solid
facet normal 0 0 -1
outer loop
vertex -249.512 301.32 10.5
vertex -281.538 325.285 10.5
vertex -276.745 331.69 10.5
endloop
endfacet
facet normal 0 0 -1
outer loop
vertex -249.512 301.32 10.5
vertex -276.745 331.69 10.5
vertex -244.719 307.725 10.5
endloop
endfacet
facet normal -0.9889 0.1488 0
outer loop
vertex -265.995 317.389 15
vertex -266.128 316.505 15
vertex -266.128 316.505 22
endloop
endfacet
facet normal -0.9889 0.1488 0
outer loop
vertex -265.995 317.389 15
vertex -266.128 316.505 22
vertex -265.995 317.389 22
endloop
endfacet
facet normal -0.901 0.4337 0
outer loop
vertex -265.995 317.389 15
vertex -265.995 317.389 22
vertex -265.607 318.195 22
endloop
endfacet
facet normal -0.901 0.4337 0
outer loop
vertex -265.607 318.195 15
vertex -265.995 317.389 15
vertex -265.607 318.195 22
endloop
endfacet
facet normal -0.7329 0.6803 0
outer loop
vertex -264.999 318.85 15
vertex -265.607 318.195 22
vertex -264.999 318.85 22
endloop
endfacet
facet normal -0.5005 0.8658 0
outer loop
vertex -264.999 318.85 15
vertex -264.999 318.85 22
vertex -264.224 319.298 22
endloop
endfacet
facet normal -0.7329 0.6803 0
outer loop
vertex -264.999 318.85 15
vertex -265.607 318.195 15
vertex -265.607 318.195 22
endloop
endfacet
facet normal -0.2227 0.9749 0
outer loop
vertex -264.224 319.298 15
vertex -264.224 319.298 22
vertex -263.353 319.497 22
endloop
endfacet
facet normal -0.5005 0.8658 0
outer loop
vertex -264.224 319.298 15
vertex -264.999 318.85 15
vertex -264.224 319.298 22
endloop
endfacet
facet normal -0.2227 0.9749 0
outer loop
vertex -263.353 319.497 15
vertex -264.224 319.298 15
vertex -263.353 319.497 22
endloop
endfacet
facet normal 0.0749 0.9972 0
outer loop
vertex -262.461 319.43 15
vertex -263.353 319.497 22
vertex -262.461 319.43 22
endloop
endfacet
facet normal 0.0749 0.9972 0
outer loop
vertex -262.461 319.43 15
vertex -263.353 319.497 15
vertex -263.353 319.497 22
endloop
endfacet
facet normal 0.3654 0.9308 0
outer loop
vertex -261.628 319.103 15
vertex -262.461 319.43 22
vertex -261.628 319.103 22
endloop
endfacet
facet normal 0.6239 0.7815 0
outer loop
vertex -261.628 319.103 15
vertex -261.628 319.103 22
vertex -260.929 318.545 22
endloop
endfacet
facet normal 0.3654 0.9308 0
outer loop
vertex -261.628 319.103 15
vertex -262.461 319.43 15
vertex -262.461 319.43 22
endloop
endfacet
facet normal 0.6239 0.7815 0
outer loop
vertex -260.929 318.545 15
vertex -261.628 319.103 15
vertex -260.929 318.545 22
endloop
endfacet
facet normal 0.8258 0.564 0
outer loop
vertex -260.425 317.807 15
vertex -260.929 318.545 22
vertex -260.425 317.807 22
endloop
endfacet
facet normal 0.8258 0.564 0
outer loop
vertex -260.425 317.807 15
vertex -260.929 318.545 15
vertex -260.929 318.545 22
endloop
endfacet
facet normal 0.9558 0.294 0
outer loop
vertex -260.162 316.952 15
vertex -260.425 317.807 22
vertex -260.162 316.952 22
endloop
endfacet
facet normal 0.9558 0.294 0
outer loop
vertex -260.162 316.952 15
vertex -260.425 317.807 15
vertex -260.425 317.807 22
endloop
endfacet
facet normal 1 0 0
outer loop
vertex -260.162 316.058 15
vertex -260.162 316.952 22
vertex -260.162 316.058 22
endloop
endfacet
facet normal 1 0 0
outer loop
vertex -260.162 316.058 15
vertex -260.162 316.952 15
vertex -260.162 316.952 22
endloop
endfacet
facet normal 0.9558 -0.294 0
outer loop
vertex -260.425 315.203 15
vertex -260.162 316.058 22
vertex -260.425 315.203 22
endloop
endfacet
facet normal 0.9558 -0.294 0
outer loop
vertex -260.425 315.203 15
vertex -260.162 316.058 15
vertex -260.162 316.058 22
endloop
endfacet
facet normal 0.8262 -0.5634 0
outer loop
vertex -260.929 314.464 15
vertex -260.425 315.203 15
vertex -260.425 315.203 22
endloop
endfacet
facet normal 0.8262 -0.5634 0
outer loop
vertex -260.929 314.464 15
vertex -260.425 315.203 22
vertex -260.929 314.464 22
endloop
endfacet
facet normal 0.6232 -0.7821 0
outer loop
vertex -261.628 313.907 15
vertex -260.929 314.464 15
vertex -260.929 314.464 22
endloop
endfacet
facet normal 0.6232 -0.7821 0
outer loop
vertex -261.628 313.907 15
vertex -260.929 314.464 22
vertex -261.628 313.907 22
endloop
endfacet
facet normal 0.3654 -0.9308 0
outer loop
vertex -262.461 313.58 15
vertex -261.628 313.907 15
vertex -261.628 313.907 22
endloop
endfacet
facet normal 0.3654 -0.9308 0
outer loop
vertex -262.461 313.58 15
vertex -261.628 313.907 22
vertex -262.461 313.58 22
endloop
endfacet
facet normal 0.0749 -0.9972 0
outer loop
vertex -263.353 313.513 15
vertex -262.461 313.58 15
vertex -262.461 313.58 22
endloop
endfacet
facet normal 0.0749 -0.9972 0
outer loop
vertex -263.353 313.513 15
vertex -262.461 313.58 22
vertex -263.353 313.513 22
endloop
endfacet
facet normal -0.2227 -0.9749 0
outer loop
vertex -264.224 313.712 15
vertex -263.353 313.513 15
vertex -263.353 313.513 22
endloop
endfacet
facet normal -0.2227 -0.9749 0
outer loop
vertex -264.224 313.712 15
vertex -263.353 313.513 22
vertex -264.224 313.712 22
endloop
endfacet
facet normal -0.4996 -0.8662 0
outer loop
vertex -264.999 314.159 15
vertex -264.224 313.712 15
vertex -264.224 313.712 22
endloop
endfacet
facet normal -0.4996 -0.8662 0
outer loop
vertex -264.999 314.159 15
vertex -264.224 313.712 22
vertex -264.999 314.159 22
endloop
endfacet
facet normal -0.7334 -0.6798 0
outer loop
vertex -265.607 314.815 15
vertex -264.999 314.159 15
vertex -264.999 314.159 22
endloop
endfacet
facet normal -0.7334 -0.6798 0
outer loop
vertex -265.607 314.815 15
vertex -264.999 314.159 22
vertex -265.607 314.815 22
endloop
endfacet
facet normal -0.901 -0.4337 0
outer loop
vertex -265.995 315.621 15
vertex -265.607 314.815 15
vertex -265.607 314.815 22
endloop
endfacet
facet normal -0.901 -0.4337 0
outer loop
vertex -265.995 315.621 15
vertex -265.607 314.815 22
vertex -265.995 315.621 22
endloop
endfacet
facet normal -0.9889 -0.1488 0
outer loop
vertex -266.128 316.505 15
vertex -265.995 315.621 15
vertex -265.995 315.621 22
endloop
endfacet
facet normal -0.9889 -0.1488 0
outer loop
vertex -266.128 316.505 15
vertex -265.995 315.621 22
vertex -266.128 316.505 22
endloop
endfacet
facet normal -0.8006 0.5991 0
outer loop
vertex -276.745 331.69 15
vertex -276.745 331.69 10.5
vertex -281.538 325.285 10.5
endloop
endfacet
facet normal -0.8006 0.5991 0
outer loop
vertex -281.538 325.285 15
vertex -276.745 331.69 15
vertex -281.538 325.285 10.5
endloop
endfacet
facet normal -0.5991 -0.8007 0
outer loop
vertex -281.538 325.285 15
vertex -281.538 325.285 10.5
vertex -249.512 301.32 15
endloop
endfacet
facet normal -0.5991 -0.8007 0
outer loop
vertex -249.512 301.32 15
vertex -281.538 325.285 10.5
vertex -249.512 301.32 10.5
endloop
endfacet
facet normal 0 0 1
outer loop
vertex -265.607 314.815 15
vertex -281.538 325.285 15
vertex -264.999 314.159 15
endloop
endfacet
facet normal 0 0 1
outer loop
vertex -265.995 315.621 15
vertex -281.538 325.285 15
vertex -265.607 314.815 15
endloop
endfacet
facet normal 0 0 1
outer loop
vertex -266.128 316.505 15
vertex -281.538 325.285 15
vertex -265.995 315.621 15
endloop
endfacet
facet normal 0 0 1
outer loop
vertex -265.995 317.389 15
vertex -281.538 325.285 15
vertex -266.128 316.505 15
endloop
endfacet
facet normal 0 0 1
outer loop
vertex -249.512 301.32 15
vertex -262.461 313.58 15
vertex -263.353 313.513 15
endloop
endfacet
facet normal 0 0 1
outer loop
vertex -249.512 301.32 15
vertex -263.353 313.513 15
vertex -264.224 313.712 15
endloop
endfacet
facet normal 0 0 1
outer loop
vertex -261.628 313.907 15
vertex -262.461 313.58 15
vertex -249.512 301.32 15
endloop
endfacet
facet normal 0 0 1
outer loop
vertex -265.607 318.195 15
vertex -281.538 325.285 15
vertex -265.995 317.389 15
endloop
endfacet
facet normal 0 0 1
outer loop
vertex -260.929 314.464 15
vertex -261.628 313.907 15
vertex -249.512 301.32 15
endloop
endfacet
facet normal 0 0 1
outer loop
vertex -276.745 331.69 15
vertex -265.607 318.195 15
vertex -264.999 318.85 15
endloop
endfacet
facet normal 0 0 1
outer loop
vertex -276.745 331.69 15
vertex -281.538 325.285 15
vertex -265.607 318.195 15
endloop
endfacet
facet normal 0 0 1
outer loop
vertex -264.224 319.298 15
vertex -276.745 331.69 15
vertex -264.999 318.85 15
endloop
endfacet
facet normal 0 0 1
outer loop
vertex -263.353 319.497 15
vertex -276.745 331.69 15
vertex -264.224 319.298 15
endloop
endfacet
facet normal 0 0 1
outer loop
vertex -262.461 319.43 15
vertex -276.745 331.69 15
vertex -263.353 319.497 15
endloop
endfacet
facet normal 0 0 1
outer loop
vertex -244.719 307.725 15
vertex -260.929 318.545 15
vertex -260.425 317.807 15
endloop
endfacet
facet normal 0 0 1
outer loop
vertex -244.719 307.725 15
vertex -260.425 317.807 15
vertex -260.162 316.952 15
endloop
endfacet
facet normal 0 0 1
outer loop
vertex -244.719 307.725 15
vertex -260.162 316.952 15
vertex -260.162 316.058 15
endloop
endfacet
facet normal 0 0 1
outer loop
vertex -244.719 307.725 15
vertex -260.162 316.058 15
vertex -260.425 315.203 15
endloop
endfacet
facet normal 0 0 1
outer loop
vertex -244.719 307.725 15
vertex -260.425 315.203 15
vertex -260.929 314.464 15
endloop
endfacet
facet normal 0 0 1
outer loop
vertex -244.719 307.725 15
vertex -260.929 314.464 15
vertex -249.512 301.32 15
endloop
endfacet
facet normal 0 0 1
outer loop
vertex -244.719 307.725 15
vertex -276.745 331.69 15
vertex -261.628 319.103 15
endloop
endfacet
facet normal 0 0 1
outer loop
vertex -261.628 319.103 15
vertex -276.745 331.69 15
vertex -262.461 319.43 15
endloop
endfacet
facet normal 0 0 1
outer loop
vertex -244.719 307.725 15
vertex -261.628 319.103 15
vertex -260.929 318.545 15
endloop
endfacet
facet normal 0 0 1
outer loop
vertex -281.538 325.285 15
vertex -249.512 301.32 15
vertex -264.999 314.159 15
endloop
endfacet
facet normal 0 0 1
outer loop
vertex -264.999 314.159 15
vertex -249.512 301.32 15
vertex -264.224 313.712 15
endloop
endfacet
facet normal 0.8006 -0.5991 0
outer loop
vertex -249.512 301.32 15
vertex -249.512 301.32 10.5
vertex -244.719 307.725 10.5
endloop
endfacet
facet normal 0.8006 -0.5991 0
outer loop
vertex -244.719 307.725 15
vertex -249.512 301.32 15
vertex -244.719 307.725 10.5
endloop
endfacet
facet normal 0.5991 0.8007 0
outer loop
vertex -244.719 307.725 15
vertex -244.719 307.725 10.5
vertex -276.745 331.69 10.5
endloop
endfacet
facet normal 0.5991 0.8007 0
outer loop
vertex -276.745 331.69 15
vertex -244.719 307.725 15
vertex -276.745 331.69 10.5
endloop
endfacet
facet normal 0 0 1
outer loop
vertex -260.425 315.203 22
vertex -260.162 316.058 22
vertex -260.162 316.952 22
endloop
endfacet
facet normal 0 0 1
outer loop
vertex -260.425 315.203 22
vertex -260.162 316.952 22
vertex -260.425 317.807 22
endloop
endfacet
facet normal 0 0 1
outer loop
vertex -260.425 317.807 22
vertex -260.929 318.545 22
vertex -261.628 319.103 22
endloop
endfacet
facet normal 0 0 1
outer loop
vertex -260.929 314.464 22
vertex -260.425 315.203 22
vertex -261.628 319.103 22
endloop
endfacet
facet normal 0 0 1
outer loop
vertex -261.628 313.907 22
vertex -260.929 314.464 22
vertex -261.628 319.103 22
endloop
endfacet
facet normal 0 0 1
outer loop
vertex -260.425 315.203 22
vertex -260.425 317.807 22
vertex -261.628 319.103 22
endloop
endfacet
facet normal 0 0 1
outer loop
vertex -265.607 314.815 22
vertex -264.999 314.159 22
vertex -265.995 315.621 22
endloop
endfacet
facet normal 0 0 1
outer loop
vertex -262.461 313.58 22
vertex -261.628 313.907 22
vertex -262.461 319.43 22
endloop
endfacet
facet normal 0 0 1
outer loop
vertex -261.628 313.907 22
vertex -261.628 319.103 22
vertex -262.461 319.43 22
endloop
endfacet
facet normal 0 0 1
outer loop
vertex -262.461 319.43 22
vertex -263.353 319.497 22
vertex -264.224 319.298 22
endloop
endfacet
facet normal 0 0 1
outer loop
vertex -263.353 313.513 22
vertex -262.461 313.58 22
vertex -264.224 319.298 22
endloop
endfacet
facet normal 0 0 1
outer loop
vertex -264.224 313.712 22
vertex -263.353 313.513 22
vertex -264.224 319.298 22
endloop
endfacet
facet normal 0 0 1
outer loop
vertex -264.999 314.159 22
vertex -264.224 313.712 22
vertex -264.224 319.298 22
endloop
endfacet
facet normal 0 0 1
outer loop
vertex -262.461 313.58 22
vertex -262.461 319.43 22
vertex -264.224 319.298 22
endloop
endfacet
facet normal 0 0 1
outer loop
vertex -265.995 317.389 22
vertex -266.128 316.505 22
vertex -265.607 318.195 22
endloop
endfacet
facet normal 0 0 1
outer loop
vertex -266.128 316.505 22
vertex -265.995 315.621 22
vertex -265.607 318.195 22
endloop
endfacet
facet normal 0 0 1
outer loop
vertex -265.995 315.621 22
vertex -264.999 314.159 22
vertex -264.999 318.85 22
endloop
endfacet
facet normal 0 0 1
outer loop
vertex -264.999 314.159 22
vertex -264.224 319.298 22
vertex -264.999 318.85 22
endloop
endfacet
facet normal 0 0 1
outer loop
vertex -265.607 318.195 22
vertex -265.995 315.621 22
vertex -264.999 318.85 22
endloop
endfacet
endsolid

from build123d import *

# Parameters (mm, degrees)
VASTAGO_PROFILE_R = 3
GOMA_START        = 10.5
GOMA_DEPTH        = 4.5


with BuildPart() as part:
    # Vastago: sweep along a curve in space
    with BuildLine() as vastago_path:
        Line((-263.128358849, 316.504901668, 22), (-263.128358849, 316.504901668, 15))
    # Vastago profile (on start of the path) → Vastago (sweep)
    with BuildSketch(Plane(origin=(-263.128358849, 316.504901668, 22), x_dir=(-1, 0, 0), z_dir=(0, 0, -1))):
        Circle(VASTAGO_PROFILE_R)
    sweep(path=vastago_path.line)

    # Sk_Goma → Goma (add)
    with BuildSketch(Plane.XY.offset(GOMA_START)):
        Polygon((-249.511779913, 301.319751749), (-244.718766785, 307.724985949), (-276.744937786, 331.690051587), (-281.537950914, 325.284817387), align=None)
    extrude(amount=GOMA_DEPTH)


solid = part.part
